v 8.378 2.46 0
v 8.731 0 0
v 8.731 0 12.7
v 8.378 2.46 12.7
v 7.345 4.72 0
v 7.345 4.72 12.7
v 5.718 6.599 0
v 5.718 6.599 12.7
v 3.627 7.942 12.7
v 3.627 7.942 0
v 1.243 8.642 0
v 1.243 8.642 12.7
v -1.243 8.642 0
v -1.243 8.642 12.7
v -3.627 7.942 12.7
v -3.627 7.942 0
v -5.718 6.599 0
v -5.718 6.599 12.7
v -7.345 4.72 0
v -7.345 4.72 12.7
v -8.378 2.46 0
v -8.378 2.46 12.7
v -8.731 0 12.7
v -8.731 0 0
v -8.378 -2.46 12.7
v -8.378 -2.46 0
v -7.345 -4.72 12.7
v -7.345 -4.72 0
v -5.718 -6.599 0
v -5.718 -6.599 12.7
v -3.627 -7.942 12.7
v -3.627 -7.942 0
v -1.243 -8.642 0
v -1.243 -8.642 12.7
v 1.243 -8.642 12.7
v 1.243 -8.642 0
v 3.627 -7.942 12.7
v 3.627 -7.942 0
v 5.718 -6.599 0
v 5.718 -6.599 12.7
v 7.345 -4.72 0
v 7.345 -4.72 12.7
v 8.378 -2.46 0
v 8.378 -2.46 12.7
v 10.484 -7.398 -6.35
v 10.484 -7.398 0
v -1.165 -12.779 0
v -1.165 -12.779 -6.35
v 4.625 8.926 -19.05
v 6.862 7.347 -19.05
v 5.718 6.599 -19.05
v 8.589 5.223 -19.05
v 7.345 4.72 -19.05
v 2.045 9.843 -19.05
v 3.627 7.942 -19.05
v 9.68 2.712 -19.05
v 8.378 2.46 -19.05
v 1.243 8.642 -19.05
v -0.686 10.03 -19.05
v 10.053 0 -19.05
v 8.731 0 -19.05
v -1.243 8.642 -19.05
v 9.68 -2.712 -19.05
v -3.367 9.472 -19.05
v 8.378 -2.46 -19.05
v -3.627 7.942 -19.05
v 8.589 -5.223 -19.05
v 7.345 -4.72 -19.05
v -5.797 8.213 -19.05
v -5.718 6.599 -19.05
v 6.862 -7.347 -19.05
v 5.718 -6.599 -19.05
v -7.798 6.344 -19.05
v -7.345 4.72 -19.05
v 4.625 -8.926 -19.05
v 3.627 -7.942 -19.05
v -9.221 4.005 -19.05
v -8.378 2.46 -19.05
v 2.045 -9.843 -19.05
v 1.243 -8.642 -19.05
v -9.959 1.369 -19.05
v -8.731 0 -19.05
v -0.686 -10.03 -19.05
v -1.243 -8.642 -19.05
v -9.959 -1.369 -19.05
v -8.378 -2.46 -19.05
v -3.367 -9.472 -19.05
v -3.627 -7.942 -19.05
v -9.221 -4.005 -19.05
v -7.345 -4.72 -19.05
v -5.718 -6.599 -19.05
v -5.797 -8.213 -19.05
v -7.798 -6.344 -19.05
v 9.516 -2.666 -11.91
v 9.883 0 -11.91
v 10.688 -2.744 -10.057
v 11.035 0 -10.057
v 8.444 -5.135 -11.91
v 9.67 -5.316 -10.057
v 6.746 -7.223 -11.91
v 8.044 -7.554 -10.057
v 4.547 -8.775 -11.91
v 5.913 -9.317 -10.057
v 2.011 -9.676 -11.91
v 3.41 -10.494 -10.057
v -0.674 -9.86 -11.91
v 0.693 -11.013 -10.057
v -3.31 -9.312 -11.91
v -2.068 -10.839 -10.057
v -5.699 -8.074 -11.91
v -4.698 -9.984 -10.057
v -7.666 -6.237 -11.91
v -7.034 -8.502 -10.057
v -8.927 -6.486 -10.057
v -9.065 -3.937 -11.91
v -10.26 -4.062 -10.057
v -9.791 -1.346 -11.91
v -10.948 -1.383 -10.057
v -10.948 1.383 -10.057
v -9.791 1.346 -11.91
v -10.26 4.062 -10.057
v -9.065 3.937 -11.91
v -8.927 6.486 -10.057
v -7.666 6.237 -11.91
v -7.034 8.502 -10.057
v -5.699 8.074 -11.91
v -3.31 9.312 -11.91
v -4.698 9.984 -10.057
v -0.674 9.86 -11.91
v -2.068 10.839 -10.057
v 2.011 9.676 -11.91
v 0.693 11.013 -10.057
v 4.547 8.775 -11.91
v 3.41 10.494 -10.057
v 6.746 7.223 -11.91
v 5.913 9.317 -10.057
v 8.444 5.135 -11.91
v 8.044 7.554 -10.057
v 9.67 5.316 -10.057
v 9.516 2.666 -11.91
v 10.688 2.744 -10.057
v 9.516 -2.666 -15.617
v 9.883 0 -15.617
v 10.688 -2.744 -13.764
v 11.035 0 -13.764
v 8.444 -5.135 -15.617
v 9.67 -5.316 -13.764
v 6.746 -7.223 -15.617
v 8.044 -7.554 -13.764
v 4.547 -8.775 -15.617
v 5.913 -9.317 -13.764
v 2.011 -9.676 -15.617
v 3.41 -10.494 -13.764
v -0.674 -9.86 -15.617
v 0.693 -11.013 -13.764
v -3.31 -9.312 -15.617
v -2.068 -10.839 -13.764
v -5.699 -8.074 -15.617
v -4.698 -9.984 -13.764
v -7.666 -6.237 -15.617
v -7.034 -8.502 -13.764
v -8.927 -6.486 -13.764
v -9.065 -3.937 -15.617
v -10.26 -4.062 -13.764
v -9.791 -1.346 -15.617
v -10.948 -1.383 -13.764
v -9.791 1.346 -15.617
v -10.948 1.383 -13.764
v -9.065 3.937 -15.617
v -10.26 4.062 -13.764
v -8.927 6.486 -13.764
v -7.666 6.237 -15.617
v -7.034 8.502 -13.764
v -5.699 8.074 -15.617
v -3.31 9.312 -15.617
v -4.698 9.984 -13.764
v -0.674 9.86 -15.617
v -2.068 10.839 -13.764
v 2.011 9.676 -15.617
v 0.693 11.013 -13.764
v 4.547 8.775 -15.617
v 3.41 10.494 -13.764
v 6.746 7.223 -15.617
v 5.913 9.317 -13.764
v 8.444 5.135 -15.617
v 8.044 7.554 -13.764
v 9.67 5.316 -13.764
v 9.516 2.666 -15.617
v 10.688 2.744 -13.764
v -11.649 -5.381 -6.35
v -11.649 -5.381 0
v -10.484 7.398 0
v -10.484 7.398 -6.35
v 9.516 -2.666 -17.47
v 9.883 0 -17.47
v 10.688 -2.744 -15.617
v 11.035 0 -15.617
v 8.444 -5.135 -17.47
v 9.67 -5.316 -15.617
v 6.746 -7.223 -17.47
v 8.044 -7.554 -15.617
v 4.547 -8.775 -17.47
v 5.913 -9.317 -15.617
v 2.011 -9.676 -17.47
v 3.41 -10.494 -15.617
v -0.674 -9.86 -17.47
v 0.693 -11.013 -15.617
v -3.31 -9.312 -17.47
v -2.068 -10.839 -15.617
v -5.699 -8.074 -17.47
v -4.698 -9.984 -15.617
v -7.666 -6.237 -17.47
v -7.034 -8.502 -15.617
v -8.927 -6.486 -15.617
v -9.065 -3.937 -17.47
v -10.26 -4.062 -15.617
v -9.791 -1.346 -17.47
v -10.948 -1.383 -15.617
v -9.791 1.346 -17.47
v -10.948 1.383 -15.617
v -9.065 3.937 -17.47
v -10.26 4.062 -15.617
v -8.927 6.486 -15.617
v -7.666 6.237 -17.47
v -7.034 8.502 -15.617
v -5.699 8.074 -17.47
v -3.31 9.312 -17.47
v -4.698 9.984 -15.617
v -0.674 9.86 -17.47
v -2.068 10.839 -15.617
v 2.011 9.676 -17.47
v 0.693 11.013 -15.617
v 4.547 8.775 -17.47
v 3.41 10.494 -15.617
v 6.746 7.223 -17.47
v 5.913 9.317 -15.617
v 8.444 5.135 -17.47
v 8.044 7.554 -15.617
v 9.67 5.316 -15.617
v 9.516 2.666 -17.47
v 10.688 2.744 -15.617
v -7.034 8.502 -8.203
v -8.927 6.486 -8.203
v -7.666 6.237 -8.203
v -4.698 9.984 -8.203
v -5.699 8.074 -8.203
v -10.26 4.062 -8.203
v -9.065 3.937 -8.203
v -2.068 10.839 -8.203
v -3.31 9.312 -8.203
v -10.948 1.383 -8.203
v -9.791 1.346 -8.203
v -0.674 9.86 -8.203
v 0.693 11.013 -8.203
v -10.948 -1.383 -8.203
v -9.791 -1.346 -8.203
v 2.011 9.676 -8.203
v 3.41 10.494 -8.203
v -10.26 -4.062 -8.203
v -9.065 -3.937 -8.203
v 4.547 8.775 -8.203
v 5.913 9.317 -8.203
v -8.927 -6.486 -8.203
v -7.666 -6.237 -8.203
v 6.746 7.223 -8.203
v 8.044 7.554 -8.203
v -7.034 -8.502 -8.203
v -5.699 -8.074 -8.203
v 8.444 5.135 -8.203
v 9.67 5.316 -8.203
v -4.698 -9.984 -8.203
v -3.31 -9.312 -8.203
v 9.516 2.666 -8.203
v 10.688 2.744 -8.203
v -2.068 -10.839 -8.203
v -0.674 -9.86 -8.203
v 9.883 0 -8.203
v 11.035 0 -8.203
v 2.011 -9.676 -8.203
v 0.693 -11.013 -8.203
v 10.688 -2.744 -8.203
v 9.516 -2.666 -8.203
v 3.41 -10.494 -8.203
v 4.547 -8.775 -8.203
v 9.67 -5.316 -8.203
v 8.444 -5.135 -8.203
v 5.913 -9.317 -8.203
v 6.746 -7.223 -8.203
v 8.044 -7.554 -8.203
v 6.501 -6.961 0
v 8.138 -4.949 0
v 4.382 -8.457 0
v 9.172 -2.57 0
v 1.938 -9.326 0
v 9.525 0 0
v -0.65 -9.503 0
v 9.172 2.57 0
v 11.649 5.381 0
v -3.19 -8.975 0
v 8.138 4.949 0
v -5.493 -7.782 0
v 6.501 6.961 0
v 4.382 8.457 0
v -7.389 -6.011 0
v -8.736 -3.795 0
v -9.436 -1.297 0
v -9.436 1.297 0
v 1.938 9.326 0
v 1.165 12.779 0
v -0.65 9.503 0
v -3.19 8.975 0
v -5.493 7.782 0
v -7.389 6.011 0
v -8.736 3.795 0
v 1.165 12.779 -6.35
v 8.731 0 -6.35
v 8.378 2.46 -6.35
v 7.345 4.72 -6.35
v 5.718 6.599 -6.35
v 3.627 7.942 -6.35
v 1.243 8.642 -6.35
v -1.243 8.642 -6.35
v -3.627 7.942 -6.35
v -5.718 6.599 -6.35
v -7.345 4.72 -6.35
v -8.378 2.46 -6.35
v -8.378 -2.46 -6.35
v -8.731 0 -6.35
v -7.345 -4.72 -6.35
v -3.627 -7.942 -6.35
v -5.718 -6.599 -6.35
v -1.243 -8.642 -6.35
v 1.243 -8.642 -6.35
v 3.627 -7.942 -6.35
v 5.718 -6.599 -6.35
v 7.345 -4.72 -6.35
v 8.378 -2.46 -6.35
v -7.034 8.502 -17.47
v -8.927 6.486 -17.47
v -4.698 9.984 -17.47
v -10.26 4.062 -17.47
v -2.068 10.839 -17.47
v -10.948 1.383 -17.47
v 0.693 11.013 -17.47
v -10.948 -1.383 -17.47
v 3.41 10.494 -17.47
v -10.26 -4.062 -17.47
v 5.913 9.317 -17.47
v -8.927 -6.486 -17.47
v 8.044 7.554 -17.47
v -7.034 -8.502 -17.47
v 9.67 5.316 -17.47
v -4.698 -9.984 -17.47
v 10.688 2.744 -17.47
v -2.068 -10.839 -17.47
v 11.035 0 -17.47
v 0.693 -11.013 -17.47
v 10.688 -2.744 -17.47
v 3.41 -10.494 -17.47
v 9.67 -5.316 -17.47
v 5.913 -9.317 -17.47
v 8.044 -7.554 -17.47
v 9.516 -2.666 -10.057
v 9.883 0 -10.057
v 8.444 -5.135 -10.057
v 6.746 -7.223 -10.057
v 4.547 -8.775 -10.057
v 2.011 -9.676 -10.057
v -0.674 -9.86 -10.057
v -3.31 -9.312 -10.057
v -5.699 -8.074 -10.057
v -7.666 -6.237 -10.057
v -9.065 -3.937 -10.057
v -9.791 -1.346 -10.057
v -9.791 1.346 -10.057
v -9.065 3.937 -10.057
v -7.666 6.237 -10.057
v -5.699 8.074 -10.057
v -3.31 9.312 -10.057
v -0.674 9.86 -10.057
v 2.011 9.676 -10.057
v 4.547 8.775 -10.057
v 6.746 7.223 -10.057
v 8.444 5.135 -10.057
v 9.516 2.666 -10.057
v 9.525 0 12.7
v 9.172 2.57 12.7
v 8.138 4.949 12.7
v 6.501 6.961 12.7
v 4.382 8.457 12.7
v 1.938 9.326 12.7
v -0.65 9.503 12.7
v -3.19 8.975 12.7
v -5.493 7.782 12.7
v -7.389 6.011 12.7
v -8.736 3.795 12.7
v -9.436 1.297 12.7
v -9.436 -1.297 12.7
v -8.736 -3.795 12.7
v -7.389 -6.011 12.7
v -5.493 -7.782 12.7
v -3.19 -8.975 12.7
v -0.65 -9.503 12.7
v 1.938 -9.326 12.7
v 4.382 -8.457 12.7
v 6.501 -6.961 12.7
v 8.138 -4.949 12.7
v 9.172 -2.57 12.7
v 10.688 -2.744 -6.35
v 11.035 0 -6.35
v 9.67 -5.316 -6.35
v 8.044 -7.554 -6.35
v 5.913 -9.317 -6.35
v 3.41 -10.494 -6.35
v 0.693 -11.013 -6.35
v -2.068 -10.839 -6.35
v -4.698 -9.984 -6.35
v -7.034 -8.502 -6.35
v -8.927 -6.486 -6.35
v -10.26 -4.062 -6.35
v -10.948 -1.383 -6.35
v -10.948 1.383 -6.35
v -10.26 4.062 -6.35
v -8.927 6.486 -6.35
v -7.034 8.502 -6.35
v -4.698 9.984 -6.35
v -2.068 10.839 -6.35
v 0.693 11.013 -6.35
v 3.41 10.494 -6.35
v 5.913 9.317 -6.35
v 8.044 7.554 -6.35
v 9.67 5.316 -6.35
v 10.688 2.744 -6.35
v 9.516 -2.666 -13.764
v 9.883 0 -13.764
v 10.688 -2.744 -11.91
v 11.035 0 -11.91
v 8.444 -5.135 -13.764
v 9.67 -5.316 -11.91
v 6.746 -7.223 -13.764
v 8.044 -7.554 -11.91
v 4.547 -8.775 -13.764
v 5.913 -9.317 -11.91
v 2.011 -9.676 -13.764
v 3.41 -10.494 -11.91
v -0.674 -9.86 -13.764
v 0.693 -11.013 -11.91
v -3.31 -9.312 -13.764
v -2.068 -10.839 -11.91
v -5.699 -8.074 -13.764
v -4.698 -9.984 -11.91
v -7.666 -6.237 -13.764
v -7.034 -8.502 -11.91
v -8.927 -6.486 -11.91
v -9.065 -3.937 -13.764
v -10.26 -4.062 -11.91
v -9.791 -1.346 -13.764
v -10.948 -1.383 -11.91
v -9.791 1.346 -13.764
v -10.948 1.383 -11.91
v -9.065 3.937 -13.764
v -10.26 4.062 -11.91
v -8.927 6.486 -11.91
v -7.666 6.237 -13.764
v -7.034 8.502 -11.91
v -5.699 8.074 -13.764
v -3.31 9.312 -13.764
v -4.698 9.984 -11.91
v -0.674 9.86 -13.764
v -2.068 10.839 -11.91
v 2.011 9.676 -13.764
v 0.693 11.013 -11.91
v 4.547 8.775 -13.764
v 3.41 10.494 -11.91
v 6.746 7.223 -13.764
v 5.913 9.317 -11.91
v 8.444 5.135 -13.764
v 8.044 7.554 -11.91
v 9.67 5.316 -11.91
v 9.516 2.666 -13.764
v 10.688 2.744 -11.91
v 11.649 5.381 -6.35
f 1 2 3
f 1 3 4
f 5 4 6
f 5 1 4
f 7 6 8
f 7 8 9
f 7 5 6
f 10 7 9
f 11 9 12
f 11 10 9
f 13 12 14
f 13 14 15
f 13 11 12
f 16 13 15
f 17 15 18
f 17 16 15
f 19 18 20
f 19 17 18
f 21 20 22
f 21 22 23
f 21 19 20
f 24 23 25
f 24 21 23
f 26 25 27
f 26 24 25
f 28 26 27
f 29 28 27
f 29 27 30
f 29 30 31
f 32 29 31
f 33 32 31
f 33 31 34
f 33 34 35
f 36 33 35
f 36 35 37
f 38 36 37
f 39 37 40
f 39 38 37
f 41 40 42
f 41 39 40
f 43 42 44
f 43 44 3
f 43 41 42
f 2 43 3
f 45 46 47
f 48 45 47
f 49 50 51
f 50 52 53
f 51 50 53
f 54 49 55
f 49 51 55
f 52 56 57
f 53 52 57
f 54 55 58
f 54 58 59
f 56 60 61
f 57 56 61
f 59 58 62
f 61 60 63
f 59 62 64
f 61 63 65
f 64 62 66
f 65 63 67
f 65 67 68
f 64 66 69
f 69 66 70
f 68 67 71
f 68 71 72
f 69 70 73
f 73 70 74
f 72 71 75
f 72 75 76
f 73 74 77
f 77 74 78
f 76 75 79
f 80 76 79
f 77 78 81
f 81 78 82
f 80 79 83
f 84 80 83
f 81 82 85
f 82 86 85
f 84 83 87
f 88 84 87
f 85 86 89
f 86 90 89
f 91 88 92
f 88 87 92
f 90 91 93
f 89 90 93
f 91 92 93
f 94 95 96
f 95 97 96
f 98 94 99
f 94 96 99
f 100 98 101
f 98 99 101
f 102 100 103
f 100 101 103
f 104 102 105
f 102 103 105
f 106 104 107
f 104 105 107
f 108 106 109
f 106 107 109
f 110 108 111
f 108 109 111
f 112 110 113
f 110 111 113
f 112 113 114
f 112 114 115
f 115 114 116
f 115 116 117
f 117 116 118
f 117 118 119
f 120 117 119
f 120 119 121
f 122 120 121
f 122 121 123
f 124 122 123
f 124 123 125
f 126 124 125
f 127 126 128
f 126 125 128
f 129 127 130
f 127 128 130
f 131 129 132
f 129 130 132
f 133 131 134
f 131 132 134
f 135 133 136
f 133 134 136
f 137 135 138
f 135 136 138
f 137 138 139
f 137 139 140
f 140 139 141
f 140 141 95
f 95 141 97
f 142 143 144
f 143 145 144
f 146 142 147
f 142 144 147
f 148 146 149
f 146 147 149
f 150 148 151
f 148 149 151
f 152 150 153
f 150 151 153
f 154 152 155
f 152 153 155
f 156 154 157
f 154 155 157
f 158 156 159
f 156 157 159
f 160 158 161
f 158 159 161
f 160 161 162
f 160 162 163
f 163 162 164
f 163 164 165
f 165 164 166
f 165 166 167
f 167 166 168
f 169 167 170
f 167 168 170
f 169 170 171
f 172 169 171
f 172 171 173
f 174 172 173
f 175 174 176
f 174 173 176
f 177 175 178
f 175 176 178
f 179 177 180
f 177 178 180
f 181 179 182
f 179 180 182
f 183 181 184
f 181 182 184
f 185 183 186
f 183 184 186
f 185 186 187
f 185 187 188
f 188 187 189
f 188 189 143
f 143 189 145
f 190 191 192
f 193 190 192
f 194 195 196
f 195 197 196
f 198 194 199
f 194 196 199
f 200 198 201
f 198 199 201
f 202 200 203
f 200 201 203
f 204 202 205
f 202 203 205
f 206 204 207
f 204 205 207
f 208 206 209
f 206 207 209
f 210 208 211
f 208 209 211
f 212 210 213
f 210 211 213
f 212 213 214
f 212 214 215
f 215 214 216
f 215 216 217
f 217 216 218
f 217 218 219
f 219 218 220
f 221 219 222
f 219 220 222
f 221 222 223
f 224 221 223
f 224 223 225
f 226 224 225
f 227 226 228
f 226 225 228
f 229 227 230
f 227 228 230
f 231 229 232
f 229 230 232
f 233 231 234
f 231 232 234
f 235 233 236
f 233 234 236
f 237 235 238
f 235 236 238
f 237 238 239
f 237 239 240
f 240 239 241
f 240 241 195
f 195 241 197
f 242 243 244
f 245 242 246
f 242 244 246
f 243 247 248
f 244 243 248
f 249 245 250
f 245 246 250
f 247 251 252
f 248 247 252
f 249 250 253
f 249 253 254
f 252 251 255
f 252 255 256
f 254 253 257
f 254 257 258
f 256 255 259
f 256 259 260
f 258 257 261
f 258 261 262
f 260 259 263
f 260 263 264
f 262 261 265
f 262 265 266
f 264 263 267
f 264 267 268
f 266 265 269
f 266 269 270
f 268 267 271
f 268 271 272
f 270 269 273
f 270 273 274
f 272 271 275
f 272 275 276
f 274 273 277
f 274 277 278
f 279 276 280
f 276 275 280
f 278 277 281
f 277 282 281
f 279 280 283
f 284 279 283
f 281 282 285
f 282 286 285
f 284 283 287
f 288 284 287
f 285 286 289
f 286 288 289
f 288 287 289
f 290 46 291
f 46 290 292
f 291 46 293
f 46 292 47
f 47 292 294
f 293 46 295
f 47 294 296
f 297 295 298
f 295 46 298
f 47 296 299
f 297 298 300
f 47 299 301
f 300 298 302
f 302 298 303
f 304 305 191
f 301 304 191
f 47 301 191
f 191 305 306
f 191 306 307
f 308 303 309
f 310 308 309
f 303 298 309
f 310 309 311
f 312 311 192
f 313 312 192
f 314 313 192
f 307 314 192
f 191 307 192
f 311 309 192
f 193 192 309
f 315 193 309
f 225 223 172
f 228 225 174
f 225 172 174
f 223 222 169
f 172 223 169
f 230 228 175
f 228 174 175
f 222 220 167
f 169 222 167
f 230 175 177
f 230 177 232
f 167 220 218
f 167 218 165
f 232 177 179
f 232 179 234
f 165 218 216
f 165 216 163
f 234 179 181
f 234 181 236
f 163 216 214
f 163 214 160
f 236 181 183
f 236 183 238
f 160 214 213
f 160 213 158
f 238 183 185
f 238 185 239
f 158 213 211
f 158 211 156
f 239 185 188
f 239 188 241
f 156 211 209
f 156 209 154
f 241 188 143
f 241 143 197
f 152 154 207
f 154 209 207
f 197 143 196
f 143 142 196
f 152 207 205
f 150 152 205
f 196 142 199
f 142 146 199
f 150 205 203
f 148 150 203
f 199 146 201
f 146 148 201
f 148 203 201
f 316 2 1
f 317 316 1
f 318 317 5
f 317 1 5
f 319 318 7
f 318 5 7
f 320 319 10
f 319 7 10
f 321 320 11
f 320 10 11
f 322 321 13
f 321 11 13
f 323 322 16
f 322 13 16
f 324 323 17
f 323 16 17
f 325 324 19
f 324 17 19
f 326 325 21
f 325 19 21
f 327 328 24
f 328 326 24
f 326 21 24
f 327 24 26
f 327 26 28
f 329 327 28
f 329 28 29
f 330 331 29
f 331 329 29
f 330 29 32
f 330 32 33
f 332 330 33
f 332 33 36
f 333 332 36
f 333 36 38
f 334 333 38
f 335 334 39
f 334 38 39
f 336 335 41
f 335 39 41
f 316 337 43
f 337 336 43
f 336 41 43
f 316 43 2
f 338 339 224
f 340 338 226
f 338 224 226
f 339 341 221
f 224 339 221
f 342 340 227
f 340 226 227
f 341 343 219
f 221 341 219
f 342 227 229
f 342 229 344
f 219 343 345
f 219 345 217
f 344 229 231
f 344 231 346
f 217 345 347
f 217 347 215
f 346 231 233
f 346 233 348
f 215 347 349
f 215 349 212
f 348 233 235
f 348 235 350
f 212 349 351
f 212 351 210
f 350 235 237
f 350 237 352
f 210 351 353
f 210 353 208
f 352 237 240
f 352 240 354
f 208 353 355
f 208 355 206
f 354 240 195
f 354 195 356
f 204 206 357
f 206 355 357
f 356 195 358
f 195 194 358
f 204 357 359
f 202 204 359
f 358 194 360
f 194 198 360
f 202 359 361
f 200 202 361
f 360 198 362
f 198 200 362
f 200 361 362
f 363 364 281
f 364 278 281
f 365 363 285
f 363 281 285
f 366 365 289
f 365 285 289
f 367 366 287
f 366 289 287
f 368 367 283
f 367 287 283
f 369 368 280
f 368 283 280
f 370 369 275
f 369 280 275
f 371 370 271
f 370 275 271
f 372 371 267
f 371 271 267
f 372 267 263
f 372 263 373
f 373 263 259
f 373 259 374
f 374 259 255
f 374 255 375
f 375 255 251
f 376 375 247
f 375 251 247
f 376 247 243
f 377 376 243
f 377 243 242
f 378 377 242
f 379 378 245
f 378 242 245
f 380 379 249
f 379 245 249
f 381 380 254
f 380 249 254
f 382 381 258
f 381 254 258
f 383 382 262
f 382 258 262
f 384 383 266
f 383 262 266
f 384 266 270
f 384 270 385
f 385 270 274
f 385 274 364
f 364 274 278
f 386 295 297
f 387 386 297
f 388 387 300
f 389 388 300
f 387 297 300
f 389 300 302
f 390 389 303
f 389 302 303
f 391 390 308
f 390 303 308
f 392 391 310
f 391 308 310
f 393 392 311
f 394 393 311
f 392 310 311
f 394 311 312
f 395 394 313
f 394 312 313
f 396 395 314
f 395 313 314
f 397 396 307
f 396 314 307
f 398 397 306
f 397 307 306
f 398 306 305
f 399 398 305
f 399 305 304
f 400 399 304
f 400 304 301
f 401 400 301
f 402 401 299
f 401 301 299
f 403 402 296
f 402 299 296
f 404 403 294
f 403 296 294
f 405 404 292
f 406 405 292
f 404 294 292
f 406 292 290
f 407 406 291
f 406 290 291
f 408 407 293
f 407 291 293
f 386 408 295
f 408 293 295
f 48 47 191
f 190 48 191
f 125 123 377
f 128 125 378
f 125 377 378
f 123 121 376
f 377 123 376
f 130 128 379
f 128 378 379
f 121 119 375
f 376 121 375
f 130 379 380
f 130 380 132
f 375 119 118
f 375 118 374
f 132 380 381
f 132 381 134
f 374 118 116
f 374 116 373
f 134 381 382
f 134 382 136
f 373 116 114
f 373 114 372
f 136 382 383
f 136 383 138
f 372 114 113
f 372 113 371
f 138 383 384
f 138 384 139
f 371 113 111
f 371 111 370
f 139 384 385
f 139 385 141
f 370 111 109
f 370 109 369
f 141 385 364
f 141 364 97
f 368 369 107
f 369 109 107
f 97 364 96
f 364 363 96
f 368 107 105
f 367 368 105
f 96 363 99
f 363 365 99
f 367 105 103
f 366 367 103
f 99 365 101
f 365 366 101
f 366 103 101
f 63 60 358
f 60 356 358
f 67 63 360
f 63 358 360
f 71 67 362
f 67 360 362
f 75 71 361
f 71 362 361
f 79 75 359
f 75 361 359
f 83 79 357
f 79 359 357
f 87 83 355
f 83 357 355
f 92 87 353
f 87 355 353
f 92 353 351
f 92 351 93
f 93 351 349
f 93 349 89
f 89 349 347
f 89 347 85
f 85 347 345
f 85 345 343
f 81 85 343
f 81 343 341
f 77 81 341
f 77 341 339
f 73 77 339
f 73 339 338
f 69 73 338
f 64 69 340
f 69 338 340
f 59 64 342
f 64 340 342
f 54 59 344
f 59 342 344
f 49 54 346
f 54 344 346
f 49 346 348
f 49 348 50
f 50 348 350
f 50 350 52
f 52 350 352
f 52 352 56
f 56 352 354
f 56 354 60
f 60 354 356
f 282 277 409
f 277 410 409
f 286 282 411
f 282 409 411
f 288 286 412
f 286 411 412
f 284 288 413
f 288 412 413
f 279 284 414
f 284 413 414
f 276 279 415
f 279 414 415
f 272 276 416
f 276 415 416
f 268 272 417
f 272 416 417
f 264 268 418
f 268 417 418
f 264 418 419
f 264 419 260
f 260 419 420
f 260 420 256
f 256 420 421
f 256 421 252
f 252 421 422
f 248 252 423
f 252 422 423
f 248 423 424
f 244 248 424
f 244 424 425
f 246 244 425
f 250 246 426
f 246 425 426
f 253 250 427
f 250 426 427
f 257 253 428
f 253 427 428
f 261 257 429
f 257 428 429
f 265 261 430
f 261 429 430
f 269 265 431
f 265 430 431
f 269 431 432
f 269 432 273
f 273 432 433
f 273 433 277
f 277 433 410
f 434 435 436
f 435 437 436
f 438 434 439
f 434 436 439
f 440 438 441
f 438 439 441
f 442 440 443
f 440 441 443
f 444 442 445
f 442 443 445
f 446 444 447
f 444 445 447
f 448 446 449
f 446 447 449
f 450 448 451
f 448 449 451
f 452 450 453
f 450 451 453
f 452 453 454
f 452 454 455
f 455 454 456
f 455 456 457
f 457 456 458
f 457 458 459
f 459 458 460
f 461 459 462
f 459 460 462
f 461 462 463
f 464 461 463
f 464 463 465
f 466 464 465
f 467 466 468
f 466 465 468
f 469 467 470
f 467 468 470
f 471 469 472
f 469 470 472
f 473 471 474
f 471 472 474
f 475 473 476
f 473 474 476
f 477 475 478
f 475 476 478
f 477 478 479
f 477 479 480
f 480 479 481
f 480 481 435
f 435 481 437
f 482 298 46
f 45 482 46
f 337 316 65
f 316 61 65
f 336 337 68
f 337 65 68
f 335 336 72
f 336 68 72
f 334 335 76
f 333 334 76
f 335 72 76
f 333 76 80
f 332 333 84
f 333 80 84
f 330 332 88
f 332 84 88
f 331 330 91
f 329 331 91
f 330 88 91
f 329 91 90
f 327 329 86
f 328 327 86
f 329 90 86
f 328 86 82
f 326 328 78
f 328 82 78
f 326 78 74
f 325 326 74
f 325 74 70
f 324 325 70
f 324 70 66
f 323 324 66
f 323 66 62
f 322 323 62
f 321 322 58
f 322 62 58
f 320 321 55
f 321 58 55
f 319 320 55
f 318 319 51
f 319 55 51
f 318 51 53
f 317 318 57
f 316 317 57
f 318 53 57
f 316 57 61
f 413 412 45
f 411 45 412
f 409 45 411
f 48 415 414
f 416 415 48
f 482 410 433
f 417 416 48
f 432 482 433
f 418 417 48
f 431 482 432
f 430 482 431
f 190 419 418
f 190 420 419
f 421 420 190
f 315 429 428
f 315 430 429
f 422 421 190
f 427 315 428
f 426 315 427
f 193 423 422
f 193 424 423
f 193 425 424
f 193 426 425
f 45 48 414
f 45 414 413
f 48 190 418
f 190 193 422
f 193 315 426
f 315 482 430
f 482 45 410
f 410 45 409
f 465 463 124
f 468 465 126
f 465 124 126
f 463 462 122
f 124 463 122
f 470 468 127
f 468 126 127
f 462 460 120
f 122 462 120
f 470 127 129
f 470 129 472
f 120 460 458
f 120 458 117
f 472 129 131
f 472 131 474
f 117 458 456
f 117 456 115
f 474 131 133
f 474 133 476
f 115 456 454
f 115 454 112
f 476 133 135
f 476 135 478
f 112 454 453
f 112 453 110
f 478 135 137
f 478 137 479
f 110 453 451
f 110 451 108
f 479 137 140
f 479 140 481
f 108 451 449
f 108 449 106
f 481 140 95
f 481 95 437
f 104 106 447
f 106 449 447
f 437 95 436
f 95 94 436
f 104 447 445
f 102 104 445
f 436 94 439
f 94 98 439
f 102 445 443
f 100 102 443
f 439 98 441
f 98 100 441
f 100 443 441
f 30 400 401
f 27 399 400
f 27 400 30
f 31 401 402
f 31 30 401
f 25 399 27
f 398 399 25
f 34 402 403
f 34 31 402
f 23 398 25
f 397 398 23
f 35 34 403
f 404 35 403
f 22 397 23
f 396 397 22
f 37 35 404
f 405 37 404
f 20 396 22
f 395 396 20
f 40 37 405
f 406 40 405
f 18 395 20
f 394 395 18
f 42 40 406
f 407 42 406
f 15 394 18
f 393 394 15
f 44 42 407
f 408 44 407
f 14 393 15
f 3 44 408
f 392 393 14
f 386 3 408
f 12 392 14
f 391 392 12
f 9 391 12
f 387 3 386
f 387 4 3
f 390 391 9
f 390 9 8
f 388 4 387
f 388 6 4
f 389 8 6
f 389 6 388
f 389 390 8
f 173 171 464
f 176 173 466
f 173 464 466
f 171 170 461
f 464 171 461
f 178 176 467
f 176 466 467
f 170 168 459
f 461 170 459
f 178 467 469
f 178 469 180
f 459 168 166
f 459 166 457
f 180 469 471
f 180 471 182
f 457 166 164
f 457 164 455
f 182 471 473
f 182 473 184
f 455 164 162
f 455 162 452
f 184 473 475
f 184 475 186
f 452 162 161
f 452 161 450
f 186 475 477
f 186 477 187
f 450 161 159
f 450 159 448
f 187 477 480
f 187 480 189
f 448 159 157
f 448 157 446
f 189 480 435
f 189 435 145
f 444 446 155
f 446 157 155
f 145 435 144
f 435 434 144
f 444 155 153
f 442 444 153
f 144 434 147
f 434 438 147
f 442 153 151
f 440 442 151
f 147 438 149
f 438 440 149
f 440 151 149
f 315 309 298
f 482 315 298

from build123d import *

# Parameters (mm, degrees)
SKETCH1_R           = 9.525
SKETCH1_R_2         = 8.73125
BOSS_EXTRUDE1_DEPTH = 12.7
BOSS_EXTRUDE2_DEPTH = 6.35
SKETCH4_R           = 8.73125
CUT_EXTRUDE1_DEPTH  = 37.153197474


with BuildPart() as part:
    # Sketch1 → Boss-Extrude1 (new body)
    with BuildSketch(Plane.XY):
        Circle(SKETCH1_R)
        Circle(SKETCH1_R_2, mode=Mode.SUBTRACT)
    extrude(amount=BOSS_EXTRUDE1_DEPTH)

    # Sketch2 → Boss-Extrude2 (add)
    with BuildSketch(Plane(origin=(0, 0, 0), x_dir=(-1, 0, 0), z_dir=(0, 0, -1))):
        Polygon((-10.484370366, -7.397850118), (1.164540953, -12.778656138), (11.648911318, -5.38080602), (10.484370366, 7.397850118), (-1.164540953, 12.778656138), (-11.648911318, 5.38080602), align=None)
    extrude(amount=BOSS_EXTRUDE2_DEPTH)

    # Sketch3 → Revolve1 (revolve)
    with BuildSketch(Plane(origin=(0, 0, 0), x_dir=(0, 0, -1), z_dir=(1, 0, 0)), mode=Mode.PRIVATE) as revolve1_sk:
        Polygon((6.35, 8.73125), (19.05, 8.73125), (19.05, 10.05294024), (17.470288197, 11.034529182), (17.470288197, 9.882889591), (15.616906831, 11.034529182), (15.616906831, 9.882889591), (13.763525465, 11.034529182), (13.763525465, 9.882889591), (11.910144098, 11.034529182), (11.910144098, 9.882889591), (10.056762732, 11.034529182), (10.056762732, 9.882889591), (8.203381366, 11.034529182), (8.203381366, 9.882889591), (6.35, 11.034529182), align=None)
    revolve(revolve1_sk.sketch.rotate(Axis((0, 0, 0), (0, 0, -1)), 90), axis=Axis((0, 0, 0), (0, 0, -1)))

    # Sketch4 → Cut-Extrude1 (cut, through all)
    with BuildSketch(Plane.XY.offset(12.7)):
        Circle(SKETCH4_R)
    extrude(amount=-CUT_EXTRUDE1_DEPTH, mode=Mode.SUBTRACT)


solid = part.part
